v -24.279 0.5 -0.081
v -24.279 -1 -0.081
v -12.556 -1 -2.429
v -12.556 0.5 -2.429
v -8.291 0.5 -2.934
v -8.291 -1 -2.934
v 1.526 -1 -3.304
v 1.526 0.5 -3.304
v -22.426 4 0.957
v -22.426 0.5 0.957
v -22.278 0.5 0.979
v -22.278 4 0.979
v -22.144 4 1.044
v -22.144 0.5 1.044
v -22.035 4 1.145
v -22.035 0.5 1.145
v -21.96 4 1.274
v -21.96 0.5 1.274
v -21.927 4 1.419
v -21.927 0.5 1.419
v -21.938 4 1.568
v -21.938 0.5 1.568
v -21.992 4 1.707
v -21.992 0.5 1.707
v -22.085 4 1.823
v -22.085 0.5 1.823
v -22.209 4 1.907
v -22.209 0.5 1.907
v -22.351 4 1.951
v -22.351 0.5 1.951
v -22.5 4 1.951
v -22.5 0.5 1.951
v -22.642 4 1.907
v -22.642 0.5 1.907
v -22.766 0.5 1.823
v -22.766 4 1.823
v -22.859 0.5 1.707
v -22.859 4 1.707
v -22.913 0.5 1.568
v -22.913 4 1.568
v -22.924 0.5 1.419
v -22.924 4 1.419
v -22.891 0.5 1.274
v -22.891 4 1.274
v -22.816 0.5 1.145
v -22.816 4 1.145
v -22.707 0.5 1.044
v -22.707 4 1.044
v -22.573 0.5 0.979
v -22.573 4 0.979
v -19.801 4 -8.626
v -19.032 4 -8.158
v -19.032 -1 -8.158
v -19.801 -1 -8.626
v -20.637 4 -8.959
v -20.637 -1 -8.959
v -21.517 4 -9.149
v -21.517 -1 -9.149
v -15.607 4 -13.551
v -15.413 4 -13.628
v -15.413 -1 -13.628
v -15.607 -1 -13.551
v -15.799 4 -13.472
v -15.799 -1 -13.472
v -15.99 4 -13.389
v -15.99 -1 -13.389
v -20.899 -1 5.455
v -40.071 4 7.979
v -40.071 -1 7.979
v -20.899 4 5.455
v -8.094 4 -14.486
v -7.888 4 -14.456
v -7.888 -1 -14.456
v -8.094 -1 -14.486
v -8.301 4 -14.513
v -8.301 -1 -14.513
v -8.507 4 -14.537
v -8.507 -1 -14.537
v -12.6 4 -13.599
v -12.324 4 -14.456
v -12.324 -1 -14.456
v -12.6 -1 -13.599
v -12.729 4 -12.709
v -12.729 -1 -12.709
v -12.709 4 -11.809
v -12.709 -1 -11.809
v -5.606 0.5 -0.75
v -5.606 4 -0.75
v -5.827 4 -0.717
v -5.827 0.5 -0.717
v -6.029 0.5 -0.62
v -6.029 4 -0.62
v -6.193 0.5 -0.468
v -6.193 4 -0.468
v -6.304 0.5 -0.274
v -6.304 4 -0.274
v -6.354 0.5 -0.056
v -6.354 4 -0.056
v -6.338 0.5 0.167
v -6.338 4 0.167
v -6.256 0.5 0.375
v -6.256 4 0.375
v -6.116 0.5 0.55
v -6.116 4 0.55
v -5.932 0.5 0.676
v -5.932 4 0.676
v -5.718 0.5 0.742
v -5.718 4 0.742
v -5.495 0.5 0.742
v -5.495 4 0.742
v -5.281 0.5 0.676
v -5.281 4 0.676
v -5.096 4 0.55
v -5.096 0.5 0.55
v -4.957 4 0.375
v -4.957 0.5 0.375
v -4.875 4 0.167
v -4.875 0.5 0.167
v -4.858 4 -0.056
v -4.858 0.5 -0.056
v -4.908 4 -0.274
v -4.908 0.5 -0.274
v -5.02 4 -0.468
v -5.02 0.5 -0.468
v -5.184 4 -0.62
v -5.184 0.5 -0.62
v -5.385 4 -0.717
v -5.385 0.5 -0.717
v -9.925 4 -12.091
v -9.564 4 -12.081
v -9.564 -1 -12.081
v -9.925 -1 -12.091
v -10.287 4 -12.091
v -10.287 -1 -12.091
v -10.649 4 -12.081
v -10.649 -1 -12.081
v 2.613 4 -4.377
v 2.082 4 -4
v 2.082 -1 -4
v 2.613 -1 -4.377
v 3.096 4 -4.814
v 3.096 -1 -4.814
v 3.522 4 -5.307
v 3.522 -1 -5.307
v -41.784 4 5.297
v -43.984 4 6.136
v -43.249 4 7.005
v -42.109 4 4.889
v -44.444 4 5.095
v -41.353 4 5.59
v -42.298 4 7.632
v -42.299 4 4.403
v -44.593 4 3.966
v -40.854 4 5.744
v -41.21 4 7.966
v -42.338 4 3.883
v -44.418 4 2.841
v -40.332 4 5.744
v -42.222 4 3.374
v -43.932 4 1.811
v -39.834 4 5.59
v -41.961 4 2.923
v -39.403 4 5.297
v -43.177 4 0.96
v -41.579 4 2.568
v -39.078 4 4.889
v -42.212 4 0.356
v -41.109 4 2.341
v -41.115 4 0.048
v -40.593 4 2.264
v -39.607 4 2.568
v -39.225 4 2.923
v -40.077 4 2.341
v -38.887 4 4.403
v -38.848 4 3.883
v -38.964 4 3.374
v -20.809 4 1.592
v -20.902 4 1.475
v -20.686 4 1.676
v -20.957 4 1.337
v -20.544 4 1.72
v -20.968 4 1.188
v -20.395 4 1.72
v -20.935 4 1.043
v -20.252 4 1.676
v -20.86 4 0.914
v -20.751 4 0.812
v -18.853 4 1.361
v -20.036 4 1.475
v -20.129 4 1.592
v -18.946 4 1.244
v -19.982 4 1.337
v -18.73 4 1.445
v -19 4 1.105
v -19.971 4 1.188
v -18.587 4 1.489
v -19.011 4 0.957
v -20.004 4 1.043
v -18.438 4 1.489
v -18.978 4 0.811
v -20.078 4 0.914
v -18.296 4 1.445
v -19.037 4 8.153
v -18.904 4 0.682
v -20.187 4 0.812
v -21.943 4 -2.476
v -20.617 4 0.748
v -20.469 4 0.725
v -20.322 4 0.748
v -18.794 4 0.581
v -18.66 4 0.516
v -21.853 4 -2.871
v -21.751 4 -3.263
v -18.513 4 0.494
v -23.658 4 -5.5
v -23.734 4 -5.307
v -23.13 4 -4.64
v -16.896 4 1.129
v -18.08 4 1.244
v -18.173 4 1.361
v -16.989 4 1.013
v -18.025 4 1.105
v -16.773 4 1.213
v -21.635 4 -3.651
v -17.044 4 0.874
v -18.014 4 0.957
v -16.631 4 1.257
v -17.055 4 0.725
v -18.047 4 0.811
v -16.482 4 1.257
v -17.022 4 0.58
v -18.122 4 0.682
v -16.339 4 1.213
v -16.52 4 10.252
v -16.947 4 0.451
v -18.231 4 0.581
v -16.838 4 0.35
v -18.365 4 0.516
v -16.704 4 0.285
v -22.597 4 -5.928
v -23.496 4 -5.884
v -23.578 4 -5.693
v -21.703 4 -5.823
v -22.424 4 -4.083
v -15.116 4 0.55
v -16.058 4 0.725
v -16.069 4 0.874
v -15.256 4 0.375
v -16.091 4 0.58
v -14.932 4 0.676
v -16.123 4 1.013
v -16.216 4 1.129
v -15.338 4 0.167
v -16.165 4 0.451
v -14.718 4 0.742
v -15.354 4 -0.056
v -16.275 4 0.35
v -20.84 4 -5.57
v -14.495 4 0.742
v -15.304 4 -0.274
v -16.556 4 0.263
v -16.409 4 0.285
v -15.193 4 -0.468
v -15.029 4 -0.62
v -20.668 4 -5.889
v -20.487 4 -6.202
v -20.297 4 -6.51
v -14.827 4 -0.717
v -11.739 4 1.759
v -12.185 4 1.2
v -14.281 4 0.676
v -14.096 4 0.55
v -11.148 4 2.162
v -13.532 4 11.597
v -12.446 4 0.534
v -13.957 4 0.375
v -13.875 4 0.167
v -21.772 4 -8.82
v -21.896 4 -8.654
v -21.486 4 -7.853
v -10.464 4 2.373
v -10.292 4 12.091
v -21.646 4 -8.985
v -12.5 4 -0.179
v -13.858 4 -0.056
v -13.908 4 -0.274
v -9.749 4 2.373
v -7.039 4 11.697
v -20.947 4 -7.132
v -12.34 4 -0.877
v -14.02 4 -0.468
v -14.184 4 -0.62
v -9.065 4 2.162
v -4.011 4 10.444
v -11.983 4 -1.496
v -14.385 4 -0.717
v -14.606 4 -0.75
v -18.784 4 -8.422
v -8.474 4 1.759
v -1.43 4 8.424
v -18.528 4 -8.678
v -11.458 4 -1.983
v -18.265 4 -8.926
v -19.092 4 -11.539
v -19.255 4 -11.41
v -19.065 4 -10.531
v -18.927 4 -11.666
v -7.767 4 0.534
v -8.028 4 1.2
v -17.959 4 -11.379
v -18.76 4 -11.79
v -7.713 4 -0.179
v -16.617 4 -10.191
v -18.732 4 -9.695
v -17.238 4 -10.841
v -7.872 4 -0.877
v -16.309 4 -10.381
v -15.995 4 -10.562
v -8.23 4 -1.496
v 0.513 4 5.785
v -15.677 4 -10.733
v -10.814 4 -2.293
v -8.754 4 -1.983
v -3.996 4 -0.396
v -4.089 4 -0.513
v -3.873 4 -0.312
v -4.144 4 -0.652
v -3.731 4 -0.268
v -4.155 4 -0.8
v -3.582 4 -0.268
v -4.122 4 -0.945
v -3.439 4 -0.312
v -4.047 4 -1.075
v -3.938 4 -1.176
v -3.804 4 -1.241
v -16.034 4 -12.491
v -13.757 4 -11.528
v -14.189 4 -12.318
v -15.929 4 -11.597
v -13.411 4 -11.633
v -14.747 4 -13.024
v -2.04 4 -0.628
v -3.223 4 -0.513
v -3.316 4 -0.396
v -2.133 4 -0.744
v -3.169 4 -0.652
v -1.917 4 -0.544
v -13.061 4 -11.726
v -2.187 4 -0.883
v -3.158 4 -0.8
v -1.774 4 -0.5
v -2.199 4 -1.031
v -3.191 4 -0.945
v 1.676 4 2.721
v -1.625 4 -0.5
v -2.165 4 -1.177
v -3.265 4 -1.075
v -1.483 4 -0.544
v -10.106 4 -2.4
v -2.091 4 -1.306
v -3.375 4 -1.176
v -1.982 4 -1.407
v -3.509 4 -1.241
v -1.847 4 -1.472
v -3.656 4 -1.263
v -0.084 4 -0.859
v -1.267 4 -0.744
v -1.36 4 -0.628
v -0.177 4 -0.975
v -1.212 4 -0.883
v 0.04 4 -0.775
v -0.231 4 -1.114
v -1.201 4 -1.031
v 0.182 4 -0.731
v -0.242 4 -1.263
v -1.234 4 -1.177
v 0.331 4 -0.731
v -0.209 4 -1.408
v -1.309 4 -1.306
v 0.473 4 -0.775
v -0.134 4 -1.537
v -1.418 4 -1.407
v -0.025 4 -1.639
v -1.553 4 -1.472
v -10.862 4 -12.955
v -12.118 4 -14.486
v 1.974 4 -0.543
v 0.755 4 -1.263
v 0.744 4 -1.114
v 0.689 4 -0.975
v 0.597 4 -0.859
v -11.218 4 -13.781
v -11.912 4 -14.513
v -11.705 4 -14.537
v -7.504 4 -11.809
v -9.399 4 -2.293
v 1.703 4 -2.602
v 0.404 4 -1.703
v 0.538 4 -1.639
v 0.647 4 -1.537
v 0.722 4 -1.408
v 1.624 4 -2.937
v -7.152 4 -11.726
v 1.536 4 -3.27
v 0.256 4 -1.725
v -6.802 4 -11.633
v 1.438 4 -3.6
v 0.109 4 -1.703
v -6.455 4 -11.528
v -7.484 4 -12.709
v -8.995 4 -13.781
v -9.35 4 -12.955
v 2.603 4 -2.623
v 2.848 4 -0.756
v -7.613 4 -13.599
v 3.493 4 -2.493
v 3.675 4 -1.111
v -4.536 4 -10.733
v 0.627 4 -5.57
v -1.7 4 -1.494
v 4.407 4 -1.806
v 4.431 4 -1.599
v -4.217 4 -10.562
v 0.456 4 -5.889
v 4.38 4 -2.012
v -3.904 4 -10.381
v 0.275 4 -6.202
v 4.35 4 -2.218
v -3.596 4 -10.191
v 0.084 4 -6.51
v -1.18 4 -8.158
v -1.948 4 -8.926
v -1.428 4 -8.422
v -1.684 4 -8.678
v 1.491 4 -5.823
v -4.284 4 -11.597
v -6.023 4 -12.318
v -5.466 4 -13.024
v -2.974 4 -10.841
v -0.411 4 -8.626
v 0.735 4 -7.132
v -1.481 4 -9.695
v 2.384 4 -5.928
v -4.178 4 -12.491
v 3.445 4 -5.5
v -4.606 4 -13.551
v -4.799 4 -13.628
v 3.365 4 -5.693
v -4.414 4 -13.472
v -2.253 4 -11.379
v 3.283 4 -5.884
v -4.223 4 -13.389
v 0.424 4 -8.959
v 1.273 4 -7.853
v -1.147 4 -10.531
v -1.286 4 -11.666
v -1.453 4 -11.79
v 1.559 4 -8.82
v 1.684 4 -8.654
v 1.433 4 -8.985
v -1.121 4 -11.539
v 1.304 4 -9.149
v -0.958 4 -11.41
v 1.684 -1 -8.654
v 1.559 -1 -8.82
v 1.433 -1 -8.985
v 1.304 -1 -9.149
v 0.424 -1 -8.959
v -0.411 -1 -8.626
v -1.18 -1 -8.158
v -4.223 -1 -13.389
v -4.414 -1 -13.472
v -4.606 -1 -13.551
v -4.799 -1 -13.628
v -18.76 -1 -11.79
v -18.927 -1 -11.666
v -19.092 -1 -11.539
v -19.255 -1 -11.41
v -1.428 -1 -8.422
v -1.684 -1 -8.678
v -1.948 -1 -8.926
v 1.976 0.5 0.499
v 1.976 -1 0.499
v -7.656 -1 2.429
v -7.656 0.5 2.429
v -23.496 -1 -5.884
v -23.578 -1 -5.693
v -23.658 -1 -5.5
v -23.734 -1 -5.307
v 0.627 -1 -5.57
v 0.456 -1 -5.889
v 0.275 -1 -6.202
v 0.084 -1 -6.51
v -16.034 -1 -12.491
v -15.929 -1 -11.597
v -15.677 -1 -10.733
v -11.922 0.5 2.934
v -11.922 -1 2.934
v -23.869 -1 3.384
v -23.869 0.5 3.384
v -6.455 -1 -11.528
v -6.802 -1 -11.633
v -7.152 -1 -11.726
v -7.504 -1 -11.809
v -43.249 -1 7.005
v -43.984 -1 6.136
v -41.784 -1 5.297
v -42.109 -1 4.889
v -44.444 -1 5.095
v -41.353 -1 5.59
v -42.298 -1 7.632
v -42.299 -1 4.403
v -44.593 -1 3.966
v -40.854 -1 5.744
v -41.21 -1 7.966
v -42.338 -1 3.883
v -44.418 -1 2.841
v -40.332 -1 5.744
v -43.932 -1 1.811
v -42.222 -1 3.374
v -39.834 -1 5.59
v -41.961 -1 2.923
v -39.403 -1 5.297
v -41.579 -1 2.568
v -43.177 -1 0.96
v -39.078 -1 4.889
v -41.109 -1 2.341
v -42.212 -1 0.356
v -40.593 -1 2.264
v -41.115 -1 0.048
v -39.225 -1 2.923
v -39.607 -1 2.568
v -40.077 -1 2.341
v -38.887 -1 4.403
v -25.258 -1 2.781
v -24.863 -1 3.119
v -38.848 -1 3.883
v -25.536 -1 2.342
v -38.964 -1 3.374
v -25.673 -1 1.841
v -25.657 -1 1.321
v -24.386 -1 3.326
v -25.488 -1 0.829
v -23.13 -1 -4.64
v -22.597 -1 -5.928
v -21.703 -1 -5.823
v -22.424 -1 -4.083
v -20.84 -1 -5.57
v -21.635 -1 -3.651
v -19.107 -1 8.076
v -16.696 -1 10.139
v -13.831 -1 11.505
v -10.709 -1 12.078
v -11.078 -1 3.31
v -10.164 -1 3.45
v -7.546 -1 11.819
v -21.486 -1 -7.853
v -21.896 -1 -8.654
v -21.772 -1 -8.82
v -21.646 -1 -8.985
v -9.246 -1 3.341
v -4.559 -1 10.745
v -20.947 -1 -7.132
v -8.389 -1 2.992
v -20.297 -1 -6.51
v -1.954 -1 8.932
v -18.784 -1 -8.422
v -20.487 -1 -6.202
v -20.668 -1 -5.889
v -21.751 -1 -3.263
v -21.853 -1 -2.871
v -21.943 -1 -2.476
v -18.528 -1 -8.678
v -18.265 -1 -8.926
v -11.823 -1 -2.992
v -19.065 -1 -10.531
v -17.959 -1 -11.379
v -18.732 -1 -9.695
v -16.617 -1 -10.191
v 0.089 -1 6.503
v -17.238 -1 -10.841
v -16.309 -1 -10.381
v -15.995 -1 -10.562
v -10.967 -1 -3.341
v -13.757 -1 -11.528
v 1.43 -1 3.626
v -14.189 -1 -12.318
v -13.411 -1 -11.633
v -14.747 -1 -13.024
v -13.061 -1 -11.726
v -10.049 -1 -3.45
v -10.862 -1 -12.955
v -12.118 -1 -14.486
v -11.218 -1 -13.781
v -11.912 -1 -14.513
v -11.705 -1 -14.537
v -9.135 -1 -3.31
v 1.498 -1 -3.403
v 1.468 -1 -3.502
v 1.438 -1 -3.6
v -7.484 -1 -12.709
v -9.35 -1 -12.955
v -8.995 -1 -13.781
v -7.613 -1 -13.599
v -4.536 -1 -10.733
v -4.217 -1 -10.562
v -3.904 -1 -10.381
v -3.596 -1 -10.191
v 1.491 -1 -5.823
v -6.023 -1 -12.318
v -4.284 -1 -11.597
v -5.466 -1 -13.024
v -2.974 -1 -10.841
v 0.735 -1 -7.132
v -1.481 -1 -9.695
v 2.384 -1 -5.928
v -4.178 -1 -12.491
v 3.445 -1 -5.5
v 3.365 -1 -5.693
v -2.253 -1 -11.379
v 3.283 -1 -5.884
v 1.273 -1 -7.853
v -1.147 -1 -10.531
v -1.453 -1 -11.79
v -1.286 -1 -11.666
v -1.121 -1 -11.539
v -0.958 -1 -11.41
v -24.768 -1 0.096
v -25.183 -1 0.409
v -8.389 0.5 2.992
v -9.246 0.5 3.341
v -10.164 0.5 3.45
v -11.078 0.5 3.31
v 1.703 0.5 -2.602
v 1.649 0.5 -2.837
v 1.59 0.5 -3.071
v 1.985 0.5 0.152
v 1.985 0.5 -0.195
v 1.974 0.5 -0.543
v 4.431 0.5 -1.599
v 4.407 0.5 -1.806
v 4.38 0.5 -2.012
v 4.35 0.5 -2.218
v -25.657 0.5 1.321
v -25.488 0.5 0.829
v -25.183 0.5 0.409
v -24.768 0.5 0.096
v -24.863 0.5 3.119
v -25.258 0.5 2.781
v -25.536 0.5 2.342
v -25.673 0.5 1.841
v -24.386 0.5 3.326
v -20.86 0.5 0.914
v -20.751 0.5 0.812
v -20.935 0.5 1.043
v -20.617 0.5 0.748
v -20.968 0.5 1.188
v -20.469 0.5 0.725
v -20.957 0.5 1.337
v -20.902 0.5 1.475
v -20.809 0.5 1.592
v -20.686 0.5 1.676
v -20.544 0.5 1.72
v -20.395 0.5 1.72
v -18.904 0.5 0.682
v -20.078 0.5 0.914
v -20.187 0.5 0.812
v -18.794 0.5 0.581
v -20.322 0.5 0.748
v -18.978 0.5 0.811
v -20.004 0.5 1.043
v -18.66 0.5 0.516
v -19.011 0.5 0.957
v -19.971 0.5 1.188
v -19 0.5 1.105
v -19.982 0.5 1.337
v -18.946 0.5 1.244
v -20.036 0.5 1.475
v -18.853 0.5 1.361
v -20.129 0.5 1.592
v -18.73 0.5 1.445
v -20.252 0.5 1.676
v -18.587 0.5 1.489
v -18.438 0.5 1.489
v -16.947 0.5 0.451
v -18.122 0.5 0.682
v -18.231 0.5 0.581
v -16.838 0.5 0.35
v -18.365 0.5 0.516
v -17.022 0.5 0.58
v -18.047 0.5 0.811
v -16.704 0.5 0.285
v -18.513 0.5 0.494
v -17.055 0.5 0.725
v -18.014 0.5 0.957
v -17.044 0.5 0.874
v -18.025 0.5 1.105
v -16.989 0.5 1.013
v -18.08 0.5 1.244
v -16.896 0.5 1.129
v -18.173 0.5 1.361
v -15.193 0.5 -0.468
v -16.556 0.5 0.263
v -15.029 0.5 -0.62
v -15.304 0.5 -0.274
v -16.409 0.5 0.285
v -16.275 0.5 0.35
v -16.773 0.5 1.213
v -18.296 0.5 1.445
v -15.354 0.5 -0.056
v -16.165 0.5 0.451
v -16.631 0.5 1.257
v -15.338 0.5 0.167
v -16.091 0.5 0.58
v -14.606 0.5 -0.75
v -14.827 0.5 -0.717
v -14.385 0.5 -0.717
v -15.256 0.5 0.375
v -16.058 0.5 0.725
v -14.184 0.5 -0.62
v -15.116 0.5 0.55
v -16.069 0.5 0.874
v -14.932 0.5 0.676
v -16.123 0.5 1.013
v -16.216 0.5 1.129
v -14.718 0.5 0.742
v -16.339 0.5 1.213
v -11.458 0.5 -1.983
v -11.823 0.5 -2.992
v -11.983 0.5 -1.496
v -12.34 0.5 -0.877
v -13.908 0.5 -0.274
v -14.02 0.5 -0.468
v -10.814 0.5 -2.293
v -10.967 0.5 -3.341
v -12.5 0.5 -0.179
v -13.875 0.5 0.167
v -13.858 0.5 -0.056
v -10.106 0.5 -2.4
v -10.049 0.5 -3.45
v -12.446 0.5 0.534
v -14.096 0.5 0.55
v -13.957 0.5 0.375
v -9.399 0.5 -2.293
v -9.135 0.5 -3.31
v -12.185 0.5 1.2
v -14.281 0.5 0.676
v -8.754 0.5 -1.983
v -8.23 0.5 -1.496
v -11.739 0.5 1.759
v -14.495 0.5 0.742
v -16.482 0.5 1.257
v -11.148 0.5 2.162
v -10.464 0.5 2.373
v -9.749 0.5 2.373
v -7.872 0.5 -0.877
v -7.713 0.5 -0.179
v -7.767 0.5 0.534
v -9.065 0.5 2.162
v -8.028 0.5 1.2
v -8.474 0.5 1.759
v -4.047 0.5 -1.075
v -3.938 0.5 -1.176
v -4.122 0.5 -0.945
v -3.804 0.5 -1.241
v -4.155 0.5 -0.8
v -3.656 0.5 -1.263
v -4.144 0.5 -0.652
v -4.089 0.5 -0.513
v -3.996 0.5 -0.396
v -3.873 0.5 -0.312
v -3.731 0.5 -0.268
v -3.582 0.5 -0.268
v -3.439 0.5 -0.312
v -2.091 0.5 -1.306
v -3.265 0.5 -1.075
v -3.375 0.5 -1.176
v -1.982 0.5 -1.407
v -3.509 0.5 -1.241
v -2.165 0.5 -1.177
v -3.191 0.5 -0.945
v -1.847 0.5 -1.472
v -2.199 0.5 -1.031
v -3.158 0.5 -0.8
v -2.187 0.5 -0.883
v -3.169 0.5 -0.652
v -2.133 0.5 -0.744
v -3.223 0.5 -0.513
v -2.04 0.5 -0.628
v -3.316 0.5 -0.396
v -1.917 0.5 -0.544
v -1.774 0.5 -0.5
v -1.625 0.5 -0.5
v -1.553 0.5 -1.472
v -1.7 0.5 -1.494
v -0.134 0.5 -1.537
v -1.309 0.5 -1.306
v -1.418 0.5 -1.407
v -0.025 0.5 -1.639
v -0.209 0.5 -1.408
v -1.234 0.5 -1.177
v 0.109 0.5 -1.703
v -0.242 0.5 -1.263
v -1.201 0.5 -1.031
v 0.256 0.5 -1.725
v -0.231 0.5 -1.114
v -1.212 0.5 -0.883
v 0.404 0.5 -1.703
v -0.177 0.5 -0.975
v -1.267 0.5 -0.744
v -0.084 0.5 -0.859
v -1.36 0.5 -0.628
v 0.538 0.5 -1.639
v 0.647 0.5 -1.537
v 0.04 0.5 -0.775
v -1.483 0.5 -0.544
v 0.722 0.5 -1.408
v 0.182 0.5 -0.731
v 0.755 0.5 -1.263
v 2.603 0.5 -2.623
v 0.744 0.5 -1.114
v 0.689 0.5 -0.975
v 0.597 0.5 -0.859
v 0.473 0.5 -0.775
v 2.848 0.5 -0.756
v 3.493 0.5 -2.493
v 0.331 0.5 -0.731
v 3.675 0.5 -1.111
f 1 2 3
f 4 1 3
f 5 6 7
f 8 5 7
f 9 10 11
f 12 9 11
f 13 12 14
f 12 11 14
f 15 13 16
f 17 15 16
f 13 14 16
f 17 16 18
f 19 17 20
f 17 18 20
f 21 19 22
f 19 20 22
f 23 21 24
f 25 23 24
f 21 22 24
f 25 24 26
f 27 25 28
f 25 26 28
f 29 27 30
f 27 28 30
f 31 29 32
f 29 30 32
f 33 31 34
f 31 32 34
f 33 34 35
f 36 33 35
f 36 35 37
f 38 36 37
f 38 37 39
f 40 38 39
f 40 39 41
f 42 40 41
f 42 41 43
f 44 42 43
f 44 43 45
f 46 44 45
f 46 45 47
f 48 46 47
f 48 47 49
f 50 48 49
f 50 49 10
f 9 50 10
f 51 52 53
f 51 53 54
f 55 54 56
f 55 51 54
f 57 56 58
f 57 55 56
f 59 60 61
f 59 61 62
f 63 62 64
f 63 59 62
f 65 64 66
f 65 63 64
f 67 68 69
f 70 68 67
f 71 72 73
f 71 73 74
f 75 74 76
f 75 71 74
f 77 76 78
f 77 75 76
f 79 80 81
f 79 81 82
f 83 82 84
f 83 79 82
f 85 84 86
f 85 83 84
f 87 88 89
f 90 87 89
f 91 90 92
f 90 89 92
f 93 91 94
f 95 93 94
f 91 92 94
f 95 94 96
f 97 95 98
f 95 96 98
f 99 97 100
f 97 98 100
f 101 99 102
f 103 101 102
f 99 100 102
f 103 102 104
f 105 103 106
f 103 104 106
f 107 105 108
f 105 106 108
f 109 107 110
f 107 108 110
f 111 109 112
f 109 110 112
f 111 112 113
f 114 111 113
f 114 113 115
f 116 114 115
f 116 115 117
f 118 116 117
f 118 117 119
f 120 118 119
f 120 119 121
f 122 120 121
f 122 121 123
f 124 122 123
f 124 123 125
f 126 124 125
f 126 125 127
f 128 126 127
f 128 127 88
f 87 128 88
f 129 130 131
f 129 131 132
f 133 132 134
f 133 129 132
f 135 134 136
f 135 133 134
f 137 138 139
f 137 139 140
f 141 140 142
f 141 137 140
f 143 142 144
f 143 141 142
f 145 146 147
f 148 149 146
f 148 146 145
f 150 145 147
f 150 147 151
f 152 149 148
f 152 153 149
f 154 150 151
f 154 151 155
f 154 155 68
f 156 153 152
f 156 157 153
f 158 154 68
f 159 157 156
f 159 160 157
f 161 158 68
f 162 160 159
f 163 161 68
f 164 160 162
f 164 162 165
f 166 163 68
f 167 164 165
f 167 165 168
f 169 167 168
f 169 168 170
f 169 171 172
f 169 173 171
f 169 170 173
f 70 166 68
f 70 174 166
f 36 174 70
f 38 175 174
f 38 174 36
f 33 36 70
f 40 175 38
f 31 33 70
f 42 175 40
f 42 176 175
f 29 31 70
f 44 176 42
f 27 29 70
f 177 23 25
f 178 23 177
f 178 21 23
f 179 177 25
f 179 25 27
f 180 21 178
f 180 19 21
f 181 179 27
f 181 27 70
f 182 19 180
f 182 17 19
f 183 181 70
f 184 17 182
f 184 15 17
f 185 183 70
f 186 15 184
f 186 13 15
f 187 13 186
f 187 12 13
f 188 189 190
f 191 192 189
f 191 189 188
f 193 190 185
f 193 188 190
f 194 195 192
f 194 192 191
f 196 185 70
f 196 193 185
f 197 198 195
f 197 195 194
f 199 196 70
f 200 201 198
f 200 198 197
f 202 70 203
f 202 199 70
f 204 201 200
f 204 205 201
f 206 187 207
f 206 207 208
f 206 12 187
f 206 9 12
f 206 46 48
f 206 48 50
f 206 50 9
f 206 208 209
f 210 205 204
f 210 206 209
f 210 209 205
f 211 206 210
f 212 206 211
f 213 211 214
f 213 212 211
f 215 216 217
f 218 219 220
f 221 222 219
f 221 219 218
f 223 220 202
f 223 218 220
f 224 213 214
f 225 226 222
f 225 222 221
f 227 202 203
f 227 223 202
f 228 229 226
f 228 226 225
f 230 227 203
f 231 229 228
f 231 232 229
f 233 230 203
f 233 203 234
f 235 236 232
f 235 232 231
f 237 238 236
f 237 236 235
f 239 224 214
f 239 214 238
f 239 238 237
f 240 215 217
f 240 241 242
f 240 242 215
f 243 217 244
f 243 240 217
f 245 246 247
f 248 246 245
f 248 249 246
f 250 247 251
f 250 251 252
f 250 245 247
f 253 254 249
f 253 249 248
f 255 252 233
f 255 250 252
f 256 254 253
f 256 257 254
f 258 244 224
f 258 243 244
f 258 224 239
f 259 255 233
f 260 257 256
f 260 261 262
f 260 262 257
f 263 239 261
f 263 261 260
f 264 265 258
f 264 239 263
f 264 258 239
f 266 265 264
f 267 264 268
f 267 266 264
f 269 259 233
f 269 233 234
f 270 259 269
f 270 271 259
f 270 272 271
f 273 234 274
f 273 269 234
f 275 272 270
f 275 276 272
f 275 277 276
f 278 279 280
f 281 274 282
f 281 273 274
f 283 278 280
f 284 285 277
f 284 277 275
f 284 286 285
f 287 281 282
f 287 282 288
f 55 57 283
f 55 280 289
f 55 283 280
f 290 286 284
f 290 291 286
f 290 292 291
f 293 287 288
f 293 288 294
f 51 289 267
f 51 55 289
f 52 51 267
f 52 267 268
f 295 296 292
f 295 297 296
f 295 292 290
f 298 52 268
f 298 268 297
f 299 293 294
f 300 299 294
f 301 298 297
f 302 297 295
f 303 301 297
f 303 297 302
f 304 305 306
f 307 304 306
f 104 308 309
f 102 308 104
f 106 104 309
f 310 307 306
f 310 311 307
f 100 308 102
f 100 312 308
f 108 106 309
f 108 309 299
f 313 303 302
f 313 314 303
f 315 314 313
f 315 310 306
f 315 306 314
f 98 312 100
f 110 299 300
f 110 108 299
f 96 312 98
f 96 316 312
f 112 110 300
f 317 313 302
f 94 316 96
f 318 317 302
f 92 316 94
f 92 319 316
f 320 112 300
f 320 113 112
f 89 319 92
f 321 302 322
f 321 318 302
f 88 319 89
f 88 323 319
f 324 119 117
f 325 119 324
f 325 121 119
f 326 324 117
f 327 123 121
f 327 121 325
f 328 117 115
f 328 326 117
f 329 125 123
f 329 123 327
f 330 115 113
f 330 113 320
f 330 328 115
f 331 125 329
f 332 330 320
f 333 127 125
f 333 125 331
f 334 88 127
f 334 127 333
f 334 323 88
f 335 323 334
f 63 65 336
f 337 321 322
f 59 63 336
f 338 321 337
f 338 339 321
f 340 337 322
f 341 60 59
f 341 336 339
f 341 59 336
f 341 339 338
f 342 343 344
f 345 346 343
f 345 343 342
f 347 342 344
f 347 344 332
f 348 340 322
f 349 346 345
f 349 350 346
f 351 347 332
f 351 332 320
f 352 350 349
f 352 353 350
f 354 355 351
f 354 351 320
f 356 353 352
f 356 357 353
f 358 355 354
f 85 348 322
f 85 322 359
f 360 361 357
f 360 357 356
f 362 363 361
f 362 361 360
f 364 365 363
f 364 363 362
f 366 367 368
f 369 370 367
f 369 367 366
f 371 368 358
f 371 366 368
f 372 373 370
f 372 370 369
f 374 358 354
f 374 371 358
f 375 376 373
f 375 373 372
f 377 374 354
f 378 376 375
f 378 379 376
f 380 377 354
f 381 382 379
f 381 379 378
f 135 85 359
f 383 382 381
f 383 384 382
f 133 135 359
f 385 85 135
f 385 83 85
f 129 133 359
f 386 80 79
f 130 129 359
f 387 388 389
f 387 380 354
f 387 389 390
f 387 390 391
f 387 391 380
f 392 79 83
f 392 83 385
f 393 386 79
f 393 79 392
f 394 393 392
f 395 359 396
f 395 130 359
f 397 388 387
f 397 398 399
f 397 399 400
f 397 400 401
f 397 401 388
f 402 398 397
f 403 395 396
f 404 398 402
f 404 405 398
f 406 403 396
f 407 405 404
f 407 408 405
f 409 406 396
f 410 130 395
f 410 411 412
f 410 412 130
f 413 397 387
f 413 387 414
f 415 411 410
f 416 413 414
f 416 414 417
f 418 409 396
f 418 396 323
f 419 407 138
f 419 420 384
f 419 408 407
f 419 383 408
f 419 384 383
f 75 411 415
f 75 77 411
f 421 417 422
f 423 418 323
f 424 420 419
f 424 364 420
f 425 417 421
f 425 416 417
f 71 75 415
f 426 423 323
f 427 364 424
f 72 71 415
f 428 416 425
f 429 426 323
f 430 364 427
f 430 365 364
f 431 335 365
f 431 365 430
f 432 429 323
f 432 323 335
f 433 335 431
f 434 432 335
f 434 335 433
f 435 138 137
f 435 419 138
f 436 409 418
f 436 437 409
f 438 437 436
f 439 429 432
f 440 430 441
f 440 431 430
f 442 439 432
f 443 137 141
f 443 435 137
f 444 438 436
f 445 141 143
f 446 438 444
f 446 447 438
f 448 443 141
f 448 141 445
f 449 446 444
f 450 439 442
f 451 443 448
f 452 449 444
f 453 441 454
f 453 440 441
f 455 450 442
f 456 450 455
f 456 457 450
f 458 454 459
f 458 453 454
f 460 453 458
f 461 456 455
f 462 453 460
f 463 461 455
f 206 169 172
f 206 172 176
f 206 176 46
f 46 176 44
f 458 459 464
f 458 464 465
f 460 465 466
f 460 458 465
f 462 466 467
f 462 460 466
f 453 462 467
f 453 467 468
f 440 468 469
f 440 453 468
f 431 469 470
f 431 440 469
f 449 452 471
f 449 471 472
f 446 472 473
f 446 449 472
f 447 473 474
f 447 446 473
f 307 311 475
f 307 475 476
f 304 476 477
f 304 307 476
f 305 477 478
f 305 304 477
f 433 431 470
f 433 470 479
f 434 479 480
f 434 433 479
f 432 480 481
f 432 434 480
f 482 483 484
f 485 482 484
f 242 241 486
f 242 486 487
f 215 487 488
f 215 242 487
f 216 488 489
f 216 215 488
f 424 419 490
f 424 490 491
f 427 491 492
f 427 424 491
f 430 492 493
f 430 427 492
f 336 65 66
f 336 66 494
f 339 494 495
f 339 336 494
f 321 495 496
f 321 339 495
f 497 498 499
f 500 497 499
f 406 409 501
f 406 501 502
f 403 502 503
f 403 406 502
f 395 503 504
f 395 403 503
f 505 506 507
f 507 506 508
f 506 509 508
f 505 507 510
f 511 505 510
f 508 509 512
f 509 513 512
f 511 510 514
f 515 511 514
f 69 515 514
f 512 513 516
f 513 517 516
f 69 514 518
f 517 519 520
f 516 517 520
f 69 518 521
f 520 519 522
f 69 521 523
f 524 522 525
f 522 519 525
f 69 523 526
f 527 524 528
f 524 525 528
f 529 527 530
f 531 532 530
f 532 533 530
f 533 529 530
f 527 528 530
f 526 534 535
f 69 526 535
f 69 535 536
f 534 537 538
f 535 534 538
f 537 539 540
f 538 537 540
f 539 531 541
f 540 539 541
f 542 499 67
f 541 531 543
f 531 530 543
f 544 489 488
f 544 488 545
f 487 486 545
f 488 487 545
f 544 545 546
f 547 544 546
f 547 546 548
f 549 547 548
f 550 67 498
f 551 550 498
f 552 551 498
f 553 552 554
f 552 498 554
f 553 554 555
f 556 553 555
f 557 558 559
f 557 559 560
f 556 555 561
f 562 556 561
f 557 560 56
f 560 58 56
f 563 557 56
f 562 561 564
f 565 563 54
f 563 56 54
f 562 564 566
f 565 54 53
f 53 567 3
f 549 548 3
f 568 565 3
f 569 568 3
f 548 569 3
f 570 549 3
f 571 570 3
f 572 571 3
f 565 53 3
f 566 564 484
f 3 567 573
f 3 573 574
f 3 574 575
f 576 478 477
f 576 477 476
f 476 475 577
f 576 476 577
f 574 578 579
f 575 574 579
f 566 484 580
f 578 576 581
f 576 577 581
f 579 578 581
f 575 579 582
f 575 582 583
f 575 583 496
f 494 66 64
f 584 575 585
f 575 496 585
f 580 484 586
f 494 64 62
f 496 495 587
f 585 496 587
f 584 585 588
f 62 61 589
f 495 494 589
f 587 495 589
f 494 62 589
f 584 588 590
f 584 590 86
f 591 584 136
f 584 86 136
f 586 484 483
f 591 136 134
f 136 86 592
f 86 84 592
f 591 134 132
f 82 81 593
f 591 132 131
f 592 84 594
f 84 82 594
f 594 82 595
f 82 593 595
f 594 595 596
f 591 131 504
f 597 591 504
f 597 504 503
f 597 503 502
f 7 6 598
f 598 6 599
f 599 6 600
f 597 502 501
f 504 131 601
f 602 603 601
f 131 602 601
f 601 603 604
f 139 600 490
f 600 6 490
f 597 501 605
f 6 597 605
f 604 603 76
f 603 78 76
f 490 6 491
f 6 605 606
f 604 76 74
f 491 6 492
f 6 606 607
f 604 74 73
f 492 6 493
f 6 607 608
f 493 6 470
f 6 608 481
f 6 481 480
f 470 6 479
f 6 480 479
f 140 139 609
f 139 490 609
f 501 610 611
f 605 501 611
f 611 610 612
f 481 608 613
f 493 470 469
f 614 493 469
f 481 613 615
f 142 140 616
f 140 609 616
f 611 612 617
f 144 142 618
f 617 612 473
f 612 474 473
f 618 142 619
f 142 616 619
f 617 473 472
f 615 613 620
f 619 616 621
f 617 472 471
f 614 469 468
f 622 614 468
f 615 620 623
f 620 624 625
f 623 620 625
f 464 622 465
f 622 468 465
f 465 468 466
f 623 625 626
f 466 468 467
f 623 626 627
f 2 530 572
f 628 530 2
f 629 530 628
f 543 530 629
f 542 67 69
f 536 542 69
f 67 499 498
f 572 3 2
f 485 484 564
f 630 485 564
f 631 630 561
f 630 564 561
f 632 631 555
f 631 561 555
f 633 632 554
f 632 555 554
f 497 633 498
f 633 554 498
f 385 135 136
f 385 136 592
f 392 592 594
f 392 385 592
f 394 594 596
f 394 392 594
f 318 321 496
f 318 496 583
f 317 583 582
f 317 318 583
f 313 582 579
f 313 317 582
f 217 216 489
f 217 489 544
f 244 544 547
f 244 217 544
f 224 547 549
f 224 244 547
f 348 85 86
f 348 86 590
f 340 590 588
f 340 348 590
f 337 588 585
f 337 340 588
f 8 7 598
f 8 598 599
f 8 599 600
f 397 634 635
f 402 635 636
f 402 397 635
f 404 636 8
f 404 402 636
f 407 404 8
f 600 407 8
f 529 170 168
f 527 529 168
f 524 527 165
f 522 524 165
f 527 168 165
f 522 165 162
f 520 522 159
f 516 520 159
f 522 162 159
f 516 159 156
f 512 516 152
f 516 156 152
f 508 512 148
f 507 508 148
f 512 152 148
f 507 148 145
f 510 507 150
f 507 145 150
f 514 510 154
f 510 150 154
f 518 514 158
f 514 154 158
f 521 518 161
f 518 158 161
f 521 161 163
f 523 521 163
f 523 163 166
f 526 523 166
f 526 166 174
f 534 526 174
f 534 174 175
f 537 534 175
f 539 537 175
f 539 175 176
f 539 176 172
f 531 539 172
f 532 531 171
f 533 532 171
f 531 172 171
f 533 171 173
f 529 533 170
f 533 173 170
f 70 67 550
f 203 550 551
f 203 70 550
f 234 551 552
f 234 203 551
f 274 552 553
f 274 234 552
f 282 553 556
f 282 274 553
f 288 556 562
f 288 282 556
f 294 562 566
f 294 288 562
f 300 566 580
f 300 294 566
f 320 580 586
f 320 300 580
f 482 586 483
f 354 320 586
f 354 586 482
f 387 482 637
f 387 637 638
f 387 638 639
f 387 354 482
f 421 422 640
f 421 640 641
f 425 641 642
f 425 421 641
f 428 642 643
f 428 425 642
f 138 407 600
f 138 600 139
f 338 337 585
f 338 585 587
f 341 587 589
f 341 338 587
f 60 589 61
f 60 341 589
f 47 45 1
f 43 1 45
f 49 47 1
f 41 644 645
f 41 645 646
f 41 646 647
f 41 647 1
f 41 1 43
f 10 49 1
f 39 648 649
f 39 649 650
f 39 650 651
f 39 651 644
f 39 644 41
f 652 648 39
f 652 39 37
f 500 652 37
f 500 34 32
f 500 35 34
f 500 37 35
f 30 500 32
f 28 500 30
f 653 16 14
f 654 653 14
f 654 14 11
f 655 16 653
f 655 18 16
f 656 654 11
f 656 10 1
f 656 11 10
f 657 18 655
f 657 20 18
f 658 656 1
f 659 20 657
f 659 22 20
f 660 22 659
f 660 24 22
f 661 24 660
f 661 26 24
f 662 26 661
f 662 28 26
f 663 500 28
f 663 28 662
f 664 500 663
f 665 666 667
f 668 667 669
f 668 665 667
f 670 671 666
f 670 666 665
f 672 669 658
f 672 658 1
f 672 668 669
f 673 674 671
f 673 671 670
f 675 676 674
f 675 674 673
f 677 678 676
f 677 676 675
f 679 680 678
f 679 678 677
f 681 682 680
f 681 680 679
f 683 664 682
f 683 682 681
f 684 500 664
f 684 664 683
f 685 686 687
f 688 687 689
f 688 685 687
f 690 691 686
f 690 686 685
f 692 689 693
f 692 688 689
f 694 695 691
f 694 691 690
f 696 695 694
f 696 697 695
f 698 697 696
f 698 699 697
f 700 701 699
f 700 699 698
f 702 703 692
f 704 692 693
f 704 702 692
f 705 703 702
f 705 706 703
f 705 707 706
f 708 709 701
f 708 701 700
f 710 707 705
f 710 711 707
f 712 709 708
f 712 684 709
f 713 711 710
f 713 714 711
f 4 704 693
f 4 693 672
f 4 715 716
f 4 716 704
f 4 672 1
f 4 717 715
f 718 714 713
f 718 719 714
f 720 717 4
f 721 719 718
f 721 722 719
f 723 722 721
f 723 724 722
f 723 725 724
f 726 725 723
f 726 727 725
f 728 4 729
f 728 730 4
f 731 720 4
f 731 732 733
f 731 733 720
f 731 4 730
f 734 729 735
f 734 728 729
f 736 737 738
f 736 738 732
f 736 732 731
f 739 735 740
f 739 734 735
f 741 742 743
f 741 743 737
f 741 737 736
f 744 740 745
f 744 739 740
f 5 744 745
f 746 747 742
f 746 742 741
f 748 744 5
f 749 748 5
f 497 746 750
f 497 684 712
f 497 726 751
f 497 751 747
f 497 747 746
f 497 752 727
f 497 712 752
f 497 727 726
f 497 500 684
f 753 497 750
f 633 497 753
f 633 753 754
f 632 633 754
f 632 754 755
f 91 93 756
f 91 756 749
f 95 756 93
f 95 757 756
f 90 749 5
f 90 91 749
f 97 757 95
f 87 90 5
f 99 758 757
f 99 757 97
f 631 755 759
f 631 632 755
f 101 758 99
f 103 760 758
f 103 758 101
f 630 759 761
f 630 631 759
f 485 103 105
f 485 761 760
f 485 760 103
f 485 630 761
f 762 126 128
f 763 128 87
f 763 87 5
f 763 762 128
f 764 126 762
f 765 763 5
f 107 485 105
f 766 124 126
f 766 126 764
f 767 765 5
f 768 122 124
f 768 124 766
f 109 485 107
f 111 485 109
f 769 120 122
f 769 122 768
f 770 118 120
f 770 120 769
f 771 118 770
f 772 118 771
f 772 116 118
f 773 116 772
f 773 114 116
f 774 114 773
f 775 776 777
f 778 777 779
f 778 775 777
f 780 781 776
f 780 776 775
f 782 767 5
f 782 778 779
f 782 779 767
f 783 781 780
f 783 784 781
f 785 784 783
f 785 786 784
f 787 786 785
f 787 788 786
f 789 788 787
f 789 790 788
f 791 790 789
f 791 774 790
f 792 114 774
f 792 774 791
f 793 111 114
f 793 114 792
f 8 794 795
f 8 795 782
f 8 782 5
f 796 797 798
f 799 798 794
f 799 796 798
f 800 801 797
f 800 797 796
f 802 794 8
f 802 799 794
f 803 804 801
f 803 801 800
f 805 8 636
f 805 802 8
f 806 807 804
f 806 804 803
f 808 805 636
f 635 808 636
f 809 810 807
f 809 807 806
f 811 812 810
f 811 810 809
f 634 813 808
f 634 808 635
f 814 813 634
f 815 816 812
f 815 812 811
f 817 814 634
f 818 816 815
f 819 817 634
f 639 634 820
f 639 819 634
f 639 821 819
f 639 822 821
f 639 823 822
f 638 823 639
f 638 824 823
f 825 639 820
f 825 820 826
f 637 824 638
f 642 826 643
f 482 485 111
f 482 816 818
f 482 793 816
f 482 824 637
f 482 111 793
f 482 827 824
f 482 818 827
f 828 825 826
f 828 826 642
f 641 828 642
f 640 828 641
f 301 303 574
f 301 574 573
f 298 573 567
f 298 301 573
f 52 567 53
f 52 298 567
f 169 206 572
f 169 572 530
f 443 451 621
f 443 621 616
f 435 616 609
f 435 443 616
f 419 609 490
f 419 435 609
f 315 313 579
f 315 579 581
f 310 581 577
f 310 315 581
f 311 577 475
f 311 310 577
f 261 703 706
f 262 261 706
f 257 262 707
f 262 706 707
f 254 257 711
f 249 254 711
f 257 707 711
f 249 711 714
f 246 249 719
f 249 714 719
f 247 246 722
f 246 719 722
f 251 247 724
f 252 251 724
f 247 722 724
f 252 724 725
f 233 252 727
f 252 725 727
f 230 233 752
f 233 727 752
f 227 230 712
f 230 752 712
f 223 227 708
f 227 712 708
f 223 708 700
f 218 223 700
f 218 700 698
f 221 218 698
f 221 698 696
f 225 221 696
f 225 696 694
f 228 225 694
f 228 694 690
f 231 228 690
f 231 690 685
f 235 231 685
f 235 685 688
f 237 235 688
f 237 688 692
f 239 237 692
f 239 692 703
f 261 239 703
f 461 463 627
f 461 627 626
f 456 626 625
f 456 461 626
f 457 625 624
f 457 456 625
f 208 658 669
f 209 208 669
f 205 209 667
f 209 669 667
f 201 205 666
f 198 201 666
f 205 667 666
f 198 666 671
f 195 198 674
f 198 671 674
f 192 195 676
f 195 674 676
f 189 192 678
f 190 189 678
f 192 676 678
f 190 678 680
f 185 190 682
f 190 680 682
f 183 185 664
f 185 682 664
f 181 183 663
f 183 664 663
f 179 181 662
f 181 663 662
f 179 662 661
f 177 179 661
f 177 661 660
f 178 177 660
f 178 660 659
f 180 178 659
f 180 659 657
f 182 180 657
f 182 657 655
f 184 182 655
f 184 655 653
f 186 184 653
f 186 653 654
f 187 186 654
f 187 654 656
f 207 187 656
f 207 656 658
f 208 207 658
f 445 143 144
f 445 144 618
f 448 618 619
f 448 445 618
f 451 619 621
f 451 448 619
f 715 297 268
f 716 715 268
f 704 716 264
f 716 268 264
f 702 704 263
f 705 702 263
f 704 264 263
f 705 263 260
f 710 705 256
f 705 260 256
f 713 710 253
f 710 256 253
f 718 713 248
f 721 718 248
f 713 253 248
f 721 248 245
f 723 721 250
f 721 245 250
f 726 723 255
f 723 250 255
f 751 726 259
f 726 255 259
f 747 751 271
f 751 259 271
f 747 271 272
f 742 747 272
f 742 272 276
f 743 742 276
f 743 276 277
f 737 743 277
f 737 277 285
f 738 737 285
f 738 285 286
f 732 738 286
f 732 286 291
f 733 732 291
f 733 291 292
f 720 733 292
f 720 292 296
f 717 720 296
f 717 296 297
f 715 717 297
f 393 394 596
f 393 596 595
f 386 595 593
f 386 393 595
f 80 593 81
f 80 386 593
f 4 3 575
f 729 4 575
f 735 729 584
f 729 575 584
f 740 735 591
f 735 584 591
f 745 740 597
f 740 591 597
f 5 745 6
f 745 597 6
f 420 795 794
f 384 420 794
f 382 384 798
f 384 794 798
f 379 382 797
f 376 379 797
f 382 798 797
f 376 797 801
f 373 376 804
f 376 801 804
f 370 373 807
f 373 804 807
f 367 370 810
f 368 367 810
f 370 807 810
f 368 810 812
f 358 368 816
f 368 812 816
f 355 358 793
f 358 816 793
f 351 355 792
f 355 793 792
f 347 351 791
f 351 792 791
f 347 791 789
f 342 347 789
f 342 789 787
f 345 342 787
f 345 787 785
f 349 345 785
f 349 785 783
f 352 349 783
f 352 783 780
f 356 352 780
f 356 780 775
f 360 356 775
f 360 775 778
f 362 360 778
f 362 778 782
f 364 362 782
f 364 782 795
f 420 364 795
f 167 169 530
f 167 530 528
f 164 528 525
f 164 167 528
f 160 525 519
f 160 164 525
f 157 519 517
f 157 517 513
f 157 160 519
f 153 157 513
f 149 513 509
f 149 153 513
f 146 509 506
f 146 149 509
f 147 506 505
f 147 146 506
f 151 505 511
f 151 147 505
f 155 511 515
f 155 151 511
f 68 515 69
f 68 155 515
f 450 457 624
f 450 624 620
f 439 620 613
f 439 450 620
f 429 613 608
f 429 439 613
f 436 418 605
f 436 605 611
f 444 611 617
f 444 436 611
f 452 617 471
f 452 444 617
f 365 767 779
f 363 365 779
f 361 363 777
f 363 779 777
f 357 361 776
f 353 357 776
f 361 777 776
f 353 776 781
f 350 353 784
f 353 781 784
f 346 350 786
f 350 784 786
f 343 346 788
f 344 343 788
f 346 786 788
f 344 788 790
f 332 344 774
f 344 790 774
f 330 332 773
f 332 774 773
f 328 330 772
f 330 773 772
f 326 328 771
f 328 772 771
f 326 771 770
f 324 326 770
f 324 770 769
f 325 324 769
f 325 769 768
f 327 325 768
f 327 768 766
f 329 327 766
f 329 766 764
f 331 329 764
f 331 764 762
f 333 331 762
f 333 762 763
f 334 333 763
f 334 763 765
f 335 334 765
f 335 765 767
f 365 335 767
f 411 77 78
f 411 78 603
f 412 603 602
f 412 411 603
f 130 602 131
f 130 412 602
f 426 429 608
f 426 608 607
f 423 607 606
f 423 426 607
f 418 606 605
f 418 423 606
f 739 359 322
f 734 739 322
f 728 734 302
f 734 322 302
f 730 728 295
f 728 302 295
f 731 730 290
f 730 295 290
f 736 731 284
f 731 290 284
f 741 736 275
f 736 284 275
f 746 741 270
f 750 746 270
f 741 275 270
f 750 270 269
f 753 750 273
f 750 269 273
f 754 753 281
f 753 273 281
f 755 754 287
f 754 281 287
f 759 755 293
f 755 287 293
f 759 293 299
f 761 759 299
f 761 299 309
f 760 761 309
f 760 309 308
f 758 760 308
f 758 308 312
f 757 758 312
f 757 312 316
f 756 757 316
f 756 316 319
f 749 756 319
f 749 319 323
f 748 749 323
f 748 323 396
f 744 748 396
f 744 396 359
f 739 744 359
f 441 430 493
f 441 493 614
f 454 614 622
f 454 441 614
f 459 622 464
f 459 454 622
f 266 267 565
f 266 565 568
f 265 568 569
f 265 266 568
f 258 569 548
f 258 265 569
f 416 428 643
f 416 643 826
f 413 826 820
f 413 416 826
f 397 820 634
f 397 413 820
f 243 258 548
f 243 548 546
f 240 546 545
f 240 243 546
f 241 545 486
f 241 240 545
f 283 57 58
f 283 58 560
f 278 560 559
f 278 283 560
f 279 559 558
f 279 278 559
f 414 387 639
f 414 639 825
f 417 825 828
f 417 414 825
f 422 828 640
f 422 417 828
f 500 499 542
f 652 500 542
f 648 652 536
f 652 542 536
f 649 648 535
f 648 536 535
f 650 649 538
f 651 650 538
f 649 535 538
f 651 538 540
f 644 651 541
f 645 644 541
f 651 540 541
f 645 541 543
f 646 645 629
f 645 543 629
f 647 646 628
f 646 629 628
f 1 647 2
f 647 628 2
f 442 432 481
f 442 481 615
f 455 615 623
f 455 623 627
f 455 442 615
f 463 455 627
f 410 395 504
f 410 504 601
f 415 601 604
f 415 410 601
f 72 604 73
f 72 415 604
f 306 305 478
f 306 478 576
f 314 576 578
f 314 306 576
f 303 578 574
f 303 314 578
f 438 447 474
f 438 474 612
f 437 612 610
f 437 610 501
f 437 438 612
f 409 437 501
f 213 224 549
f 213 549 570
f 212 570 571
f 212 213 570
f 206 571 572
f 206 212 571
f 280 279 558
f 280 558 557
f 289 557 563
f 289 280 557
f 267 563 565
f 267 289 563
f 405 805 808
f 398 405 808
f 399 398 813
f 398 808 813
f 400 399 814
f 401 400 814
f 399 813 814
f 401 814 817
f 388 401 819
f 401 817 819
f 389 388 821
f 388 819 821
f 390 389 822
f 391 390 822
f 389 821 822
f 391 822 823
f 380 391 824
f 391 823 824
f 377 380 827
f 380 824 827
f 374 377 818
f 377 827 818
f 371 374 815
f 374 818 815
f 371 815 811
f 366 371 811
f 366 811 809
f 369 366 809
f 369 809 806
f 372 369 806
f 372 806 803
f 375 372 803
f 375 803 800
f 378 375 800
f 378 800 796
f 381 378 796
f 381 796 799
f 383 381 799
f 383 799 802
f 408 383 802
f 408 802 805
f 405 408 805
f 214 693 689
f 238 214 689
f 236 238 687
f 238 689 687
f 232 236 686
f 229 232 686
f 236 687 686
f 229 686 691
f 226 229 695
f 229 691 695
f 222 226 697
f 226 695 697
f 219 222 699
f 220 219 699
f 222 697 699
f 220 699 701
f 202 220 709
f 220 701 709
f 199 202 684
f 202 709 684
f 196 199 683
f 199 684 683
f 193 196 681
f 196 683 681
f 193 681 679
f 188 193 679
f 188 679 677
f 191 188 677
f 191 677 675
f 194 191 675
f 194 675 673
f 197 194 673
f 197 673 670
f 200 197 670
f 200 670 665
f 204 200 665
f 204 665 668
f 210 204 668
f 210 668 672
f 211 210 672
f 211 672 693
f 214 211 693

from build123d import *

# Parameters (mm, degrees)
SKETCH1_R           = 1.75
SKETCH1_R_2         = 2.4
SKETCH1_R_3         = 0.75
BOSS_EXTRUDE1_DEPTH = 5
SKETCH2_R           = 0.500000007
SKETCH2_R_2         = 2.25
CUT_EXTRUDE1_DEPTH  = 48.168776066
CUT_EXTRUDE2_DEPTH  = 1.5


with BuildPart() as part:
    # Sketch1 → Boss-Extrude1 (new body)
    with BuildSketch(Plane(origin=(0, 4, 0), x_dir=(1, 0, 0), z_dir=(0, 1, 0))):
        with BuildLine():
            Line((1.43808022, 3.600125745), (2.081641936, 4))
            ThreePointArc((2.081641936, 4), (2.861028333, 4.588201733), (3.521749436, 5.30713988))
            ThreePointArc((3.521749436, 5.30713988), (3.405395609, 5.596745198), (3.282888305, 5.883801663))
            ThreePointArc((3.282888305, 5.883801663), (1.93527598, 5.894040025), (0.627094961, 5.57027124))
            ThreePointArc((0.627094961, 5.57027124), (0.366286148, 6.046375), (0.084372603, 6.510293938))
            ThreePointArc((0.084372603, 6.510293938), (1.018855105, 7.48132754), (1.683794586, 8.65351323))
            ThreePointArc((1.683794586, 8.65351323), (1.496450048, 8.903135899), (1.303821399, 9.148703928))
            ThreePointArc((1.303821399, 9.148703928), (-0.000522033, 8.809805691), (-1.180330337, 8.158486898))
            ThreePointArc((-1.180330337, 8.158486898), (-1.555477026, 8.550865528), (-1.947855656, 8.926012217))
            ThreePointArc((-1.947855656, 8.926012217), (-1.296536862, 10.105820521), (-0.957638625, 11.410163953))
            ThreePointArc((-0.957638625, 11.410163953), (-1.203206655, 11.602792602), (-1.452829324, 11.79013714))
            ThreePointArc((-1.452829324, 11.79013714), (-2.625015014, 11.125197659), (-3.596048616, 10.190715157))
            ThreePointArc((-3.596048616, 10.190715157), (-4.059967554, 10.472628702), (-4.536071314, 10.733437515))
            ThreePointArc((-4.536071314, 10.733437515), (-4.212302529, 12.041618533), (-4.222540891, 13.389230859))
            ThreePointArc((-4.222540891, 13.389230859), (-4.509597355, 13.511738163), (-4.799202674, 13.62809199))
            ThreePointArc((-4.799202674, 13.62809199), (-5.759348103, 12.682425791), (-6.455432668, 11.528463019))
            ThreePointArc((-6.455432668, 11.528463019), (-6.976508546, 11.680699536), (-7.503891752, 11.809396783))
            ThreePointArc((-7.503891752, 11.809396783), (-7.529737283, 13.156800143), (-7.888414517, 14.455843809))
            ThreePointArc((-7.888414517, 14.455843809), (-8.197396993, 14.499881098), (-8.507248835, 14.537314892))
            ThreePointArc((-8.507248835, 14.537314892), (-9.18992168, 13.375367565), (-9.563620196, 12.080565177))
            ThreePointArc((-9.563620196, 12.080565177), (-10.106342554, 12.09275), (-10.649064912, 12.080565177))
            ThreePointArc((-10.649064912, 12.080565177), (-11.022763428, 13.375367565), (-11.705436272, 14.537314892))
            ThreePointArc((-11.705436272, 14.537314892), (-12.015288115, 14.499881098), (-12.324270591, 14.455843809))
            ThreePointArc((-12.324270591, 14.455843809), (-12.682947825, 13.156800143), (-12.708793355, 11.809396783))
            ThreePointArc((-12.708793355, 11.809396783), (-13.236176561, 11.680699536), (-13.757252439, 11.528463019))
            ThreePointArc((-13.757252439, 11.528463019), (-14.453337005, 12.682425791), (-15.413482434, 13.62809199))
            ThreePointArc((-15.413482434, 13.62809199), (-15.703087752, 13.511738163), (-15.990144217, 13.389230859))
            ThreePointArc((-15.990144217, 13.389230859), (-16.000382579, 12.041618533), (-15.676613793, 10.733437515))
            ThreePointArc((-15.676613793, 10.733437515), (-16.152717554, 10.472628702), (-16.616636492, 10.190715157))
            ThreePointArc((-16.616636492, 10.190715157), (-17.587670094, 11.125197659), (-18.759855783, 11.79013714))
            ThreePointArc((-18.759855783, 11.79013714), (-19.009478453, 11.602792602), (-19.255046482, 11.410163953))
            ThreePointArc((-19.255046482, 11.410163953), (-18.916148245, 10.105820521), (-18.264829452, 8.926012217))
            ThreePointArc((-18.264829452, 8.926012217), (-18.657208082, 8.550865528), (-19.032354771, 8.158486898))
            ThreePointArc((-19.032354771, 8.158486898), (-20.212163074, 8.809805691), (-21.516506507, 9.148703928))
            ThreePointArc((-21.516506507, 9.148703928), (-21.709135156, 8.903135899), (-21.896479694, 8.65351323))
            ThreePointArc((-21.896479694, 8.65351323), (-21.231540213, 7.48132754), (-20.297057711, 6.510293938))
            ThreePointArc((-20.297057711, 6.510293938), (-20.578971255, 6.046375), (-20.839780068, 5.57027124))
            ThreePointArc((-20.839780068, 5.57027124), (-22.147961087, 5.894040025), (-23.495573413, 5.883801663))
            ThreePointArc((-23.495573413, 5.883801663), (-23.618080717, 5.596745198), (-23.734434544, 5.30713988))
            ThreePointArc((-23.734434544, 5.30713988), (-22.788768345, 4.346994451), (-21.634805572, 3.650909885))
            ThreePointArc((-21.634805572, 3.650909885), (-21.803584999, 3.067429176), (-21.942853375, 2.47620963))
            Line((-21.942853375, 2.47620963), (-41.11537681, -0.047900965))
            ThreePointArc((-41.11537681, -0.047900965), (-44.559051487, -4.53578518), (-40.071167272, -7.979459856))
            Line((-40.071167272, -7.979459856), (-20.898643838, -5.455349261))
            ThreePointArc((-20.898643838, -5.455349261), (-7.038913378, -11.697242445), (1.974222624, 0.542722358))
            ThreePointArc((1.974222624, 0.542722358), (3.269025011, 0.916420874), (4.430972339, 1.599093719))
            ThreePointArc((4.430972339, 1.599093719), (4.393538544, 1.908945561), (4.349501255, 2.217928037))
            ThreePointArc((4.349501255, 2.217928037), (3.050457589, 2.576605271), (1.70305423, 2.602450802))
            ThreePointArc((1.70305423, 2.602450802), (1.581217534, 3.104116905), (1.43808022, 3.600125745))
        make_face()
        with Locations(Location((-40.593272041, -4.013680411, 0), (0, 0, 90))):
            Circle(SKETCH1_R, mode=Mode.SUBTRACT)
        with Locations(Location((-10.106342554, 0, 0), (0, 0, 90))):
            Circle(SKETCH1_R_2, mode=Mode.SUBTRACT)
        with Locations(Location((-5.606342554, 0, 0), (0, 0, 90))):
            Circle(SKETCH1_R_3, mode=Mode.SUBTRACT)
        with Locations(Location((-14.606342554, 0, 0), (0, 0, 90))):
            Circle(SKETCH1_R_3, mode=Mode.SUBTRACT)
    extrude(amount=-BOSS_EXTRUDE1_DEPTH)

    # Sketch2 → Cut-Extrude1 (cut, through all)
    with BuildSketch(Plane.XZ.offset(1)):
        with Locations(Location((-22.425502423, 1.456820148, 0), (0, 0, 270))):
            Circle(SKETCH2_R)
        with Locations(Location((-16.556398443, 0.76276073, 0), (0, 0, 270))):
            Circle(SKETCH2_R)
        with Locations(Location((-20.469134429, 1.225467009, 0), (0, 0, 270))):
            Circle(SKETCH2_R)
        with Locations(Location((-18.512766436, 0.994113869, 0), (0, 0, 270))):
            Circle(SKETCH2_R)
        with Locations(Location((-3.656286665, -0.76276073, 0), (0, 0, 270))):
            Circle(SKETCH2_R)
        with Locations(Location((-1.699918672, -0.994113869, 0), (0, 0, 270))):
            Circle(SKETCH2_R)
        with Locations(Location((0.256449322, -1.225467009, 0), (0, 0, 270))):
            Circle(SKETCH2_R)
        with Locations((-10.106342554, 0)):
            Circle(SKETCH2_R_2)
    extrude(amount=-CUT_EXTRUDE1_DEPTH, mode=Mode.SUBTRACT)

    # Sketch3 → Cut-Extrude2 (cut)
    with BuildSketch(Plane.XZ.offset(1)):
        with BuildLine():
            Line((4.066067931, 0.080576868), (-7.656447881, 2.429097794))
            ThreePointArc((-7.656447881, 2.429097794), (-9.701180965, 3.426126689), (-11.922071261, 2.933535284))
            Line((-11.922071261, 2.933535284), (-23.869034652, 3.384083008))
            ThreePointArc((-23.869034652, 3.384083008), (-25.672874683, 1.840842872), (-24.278753039, -0.080576868))
            Line((-24.278753039, -0.080576868), (-12.556237227, -2.429097794))
            ThreePointArc((-12.556237227, -2.429097794), (-10.511504143, -3.426126689), (-8.290613847, -2.933535284))
            Line((-8.290613847, -2.933535284), (3.656349544, -3.384083008))
            ThreePointArc((3.656349544, -3.384083008), (5.460189575, -1.840842872), (4.066067931, 0.080576868))
        make_face()
    extrude(amount=-CUT_EXTRUDE2_DEPTH, mode=Mode.SUBTRACT)


solid = part.part
